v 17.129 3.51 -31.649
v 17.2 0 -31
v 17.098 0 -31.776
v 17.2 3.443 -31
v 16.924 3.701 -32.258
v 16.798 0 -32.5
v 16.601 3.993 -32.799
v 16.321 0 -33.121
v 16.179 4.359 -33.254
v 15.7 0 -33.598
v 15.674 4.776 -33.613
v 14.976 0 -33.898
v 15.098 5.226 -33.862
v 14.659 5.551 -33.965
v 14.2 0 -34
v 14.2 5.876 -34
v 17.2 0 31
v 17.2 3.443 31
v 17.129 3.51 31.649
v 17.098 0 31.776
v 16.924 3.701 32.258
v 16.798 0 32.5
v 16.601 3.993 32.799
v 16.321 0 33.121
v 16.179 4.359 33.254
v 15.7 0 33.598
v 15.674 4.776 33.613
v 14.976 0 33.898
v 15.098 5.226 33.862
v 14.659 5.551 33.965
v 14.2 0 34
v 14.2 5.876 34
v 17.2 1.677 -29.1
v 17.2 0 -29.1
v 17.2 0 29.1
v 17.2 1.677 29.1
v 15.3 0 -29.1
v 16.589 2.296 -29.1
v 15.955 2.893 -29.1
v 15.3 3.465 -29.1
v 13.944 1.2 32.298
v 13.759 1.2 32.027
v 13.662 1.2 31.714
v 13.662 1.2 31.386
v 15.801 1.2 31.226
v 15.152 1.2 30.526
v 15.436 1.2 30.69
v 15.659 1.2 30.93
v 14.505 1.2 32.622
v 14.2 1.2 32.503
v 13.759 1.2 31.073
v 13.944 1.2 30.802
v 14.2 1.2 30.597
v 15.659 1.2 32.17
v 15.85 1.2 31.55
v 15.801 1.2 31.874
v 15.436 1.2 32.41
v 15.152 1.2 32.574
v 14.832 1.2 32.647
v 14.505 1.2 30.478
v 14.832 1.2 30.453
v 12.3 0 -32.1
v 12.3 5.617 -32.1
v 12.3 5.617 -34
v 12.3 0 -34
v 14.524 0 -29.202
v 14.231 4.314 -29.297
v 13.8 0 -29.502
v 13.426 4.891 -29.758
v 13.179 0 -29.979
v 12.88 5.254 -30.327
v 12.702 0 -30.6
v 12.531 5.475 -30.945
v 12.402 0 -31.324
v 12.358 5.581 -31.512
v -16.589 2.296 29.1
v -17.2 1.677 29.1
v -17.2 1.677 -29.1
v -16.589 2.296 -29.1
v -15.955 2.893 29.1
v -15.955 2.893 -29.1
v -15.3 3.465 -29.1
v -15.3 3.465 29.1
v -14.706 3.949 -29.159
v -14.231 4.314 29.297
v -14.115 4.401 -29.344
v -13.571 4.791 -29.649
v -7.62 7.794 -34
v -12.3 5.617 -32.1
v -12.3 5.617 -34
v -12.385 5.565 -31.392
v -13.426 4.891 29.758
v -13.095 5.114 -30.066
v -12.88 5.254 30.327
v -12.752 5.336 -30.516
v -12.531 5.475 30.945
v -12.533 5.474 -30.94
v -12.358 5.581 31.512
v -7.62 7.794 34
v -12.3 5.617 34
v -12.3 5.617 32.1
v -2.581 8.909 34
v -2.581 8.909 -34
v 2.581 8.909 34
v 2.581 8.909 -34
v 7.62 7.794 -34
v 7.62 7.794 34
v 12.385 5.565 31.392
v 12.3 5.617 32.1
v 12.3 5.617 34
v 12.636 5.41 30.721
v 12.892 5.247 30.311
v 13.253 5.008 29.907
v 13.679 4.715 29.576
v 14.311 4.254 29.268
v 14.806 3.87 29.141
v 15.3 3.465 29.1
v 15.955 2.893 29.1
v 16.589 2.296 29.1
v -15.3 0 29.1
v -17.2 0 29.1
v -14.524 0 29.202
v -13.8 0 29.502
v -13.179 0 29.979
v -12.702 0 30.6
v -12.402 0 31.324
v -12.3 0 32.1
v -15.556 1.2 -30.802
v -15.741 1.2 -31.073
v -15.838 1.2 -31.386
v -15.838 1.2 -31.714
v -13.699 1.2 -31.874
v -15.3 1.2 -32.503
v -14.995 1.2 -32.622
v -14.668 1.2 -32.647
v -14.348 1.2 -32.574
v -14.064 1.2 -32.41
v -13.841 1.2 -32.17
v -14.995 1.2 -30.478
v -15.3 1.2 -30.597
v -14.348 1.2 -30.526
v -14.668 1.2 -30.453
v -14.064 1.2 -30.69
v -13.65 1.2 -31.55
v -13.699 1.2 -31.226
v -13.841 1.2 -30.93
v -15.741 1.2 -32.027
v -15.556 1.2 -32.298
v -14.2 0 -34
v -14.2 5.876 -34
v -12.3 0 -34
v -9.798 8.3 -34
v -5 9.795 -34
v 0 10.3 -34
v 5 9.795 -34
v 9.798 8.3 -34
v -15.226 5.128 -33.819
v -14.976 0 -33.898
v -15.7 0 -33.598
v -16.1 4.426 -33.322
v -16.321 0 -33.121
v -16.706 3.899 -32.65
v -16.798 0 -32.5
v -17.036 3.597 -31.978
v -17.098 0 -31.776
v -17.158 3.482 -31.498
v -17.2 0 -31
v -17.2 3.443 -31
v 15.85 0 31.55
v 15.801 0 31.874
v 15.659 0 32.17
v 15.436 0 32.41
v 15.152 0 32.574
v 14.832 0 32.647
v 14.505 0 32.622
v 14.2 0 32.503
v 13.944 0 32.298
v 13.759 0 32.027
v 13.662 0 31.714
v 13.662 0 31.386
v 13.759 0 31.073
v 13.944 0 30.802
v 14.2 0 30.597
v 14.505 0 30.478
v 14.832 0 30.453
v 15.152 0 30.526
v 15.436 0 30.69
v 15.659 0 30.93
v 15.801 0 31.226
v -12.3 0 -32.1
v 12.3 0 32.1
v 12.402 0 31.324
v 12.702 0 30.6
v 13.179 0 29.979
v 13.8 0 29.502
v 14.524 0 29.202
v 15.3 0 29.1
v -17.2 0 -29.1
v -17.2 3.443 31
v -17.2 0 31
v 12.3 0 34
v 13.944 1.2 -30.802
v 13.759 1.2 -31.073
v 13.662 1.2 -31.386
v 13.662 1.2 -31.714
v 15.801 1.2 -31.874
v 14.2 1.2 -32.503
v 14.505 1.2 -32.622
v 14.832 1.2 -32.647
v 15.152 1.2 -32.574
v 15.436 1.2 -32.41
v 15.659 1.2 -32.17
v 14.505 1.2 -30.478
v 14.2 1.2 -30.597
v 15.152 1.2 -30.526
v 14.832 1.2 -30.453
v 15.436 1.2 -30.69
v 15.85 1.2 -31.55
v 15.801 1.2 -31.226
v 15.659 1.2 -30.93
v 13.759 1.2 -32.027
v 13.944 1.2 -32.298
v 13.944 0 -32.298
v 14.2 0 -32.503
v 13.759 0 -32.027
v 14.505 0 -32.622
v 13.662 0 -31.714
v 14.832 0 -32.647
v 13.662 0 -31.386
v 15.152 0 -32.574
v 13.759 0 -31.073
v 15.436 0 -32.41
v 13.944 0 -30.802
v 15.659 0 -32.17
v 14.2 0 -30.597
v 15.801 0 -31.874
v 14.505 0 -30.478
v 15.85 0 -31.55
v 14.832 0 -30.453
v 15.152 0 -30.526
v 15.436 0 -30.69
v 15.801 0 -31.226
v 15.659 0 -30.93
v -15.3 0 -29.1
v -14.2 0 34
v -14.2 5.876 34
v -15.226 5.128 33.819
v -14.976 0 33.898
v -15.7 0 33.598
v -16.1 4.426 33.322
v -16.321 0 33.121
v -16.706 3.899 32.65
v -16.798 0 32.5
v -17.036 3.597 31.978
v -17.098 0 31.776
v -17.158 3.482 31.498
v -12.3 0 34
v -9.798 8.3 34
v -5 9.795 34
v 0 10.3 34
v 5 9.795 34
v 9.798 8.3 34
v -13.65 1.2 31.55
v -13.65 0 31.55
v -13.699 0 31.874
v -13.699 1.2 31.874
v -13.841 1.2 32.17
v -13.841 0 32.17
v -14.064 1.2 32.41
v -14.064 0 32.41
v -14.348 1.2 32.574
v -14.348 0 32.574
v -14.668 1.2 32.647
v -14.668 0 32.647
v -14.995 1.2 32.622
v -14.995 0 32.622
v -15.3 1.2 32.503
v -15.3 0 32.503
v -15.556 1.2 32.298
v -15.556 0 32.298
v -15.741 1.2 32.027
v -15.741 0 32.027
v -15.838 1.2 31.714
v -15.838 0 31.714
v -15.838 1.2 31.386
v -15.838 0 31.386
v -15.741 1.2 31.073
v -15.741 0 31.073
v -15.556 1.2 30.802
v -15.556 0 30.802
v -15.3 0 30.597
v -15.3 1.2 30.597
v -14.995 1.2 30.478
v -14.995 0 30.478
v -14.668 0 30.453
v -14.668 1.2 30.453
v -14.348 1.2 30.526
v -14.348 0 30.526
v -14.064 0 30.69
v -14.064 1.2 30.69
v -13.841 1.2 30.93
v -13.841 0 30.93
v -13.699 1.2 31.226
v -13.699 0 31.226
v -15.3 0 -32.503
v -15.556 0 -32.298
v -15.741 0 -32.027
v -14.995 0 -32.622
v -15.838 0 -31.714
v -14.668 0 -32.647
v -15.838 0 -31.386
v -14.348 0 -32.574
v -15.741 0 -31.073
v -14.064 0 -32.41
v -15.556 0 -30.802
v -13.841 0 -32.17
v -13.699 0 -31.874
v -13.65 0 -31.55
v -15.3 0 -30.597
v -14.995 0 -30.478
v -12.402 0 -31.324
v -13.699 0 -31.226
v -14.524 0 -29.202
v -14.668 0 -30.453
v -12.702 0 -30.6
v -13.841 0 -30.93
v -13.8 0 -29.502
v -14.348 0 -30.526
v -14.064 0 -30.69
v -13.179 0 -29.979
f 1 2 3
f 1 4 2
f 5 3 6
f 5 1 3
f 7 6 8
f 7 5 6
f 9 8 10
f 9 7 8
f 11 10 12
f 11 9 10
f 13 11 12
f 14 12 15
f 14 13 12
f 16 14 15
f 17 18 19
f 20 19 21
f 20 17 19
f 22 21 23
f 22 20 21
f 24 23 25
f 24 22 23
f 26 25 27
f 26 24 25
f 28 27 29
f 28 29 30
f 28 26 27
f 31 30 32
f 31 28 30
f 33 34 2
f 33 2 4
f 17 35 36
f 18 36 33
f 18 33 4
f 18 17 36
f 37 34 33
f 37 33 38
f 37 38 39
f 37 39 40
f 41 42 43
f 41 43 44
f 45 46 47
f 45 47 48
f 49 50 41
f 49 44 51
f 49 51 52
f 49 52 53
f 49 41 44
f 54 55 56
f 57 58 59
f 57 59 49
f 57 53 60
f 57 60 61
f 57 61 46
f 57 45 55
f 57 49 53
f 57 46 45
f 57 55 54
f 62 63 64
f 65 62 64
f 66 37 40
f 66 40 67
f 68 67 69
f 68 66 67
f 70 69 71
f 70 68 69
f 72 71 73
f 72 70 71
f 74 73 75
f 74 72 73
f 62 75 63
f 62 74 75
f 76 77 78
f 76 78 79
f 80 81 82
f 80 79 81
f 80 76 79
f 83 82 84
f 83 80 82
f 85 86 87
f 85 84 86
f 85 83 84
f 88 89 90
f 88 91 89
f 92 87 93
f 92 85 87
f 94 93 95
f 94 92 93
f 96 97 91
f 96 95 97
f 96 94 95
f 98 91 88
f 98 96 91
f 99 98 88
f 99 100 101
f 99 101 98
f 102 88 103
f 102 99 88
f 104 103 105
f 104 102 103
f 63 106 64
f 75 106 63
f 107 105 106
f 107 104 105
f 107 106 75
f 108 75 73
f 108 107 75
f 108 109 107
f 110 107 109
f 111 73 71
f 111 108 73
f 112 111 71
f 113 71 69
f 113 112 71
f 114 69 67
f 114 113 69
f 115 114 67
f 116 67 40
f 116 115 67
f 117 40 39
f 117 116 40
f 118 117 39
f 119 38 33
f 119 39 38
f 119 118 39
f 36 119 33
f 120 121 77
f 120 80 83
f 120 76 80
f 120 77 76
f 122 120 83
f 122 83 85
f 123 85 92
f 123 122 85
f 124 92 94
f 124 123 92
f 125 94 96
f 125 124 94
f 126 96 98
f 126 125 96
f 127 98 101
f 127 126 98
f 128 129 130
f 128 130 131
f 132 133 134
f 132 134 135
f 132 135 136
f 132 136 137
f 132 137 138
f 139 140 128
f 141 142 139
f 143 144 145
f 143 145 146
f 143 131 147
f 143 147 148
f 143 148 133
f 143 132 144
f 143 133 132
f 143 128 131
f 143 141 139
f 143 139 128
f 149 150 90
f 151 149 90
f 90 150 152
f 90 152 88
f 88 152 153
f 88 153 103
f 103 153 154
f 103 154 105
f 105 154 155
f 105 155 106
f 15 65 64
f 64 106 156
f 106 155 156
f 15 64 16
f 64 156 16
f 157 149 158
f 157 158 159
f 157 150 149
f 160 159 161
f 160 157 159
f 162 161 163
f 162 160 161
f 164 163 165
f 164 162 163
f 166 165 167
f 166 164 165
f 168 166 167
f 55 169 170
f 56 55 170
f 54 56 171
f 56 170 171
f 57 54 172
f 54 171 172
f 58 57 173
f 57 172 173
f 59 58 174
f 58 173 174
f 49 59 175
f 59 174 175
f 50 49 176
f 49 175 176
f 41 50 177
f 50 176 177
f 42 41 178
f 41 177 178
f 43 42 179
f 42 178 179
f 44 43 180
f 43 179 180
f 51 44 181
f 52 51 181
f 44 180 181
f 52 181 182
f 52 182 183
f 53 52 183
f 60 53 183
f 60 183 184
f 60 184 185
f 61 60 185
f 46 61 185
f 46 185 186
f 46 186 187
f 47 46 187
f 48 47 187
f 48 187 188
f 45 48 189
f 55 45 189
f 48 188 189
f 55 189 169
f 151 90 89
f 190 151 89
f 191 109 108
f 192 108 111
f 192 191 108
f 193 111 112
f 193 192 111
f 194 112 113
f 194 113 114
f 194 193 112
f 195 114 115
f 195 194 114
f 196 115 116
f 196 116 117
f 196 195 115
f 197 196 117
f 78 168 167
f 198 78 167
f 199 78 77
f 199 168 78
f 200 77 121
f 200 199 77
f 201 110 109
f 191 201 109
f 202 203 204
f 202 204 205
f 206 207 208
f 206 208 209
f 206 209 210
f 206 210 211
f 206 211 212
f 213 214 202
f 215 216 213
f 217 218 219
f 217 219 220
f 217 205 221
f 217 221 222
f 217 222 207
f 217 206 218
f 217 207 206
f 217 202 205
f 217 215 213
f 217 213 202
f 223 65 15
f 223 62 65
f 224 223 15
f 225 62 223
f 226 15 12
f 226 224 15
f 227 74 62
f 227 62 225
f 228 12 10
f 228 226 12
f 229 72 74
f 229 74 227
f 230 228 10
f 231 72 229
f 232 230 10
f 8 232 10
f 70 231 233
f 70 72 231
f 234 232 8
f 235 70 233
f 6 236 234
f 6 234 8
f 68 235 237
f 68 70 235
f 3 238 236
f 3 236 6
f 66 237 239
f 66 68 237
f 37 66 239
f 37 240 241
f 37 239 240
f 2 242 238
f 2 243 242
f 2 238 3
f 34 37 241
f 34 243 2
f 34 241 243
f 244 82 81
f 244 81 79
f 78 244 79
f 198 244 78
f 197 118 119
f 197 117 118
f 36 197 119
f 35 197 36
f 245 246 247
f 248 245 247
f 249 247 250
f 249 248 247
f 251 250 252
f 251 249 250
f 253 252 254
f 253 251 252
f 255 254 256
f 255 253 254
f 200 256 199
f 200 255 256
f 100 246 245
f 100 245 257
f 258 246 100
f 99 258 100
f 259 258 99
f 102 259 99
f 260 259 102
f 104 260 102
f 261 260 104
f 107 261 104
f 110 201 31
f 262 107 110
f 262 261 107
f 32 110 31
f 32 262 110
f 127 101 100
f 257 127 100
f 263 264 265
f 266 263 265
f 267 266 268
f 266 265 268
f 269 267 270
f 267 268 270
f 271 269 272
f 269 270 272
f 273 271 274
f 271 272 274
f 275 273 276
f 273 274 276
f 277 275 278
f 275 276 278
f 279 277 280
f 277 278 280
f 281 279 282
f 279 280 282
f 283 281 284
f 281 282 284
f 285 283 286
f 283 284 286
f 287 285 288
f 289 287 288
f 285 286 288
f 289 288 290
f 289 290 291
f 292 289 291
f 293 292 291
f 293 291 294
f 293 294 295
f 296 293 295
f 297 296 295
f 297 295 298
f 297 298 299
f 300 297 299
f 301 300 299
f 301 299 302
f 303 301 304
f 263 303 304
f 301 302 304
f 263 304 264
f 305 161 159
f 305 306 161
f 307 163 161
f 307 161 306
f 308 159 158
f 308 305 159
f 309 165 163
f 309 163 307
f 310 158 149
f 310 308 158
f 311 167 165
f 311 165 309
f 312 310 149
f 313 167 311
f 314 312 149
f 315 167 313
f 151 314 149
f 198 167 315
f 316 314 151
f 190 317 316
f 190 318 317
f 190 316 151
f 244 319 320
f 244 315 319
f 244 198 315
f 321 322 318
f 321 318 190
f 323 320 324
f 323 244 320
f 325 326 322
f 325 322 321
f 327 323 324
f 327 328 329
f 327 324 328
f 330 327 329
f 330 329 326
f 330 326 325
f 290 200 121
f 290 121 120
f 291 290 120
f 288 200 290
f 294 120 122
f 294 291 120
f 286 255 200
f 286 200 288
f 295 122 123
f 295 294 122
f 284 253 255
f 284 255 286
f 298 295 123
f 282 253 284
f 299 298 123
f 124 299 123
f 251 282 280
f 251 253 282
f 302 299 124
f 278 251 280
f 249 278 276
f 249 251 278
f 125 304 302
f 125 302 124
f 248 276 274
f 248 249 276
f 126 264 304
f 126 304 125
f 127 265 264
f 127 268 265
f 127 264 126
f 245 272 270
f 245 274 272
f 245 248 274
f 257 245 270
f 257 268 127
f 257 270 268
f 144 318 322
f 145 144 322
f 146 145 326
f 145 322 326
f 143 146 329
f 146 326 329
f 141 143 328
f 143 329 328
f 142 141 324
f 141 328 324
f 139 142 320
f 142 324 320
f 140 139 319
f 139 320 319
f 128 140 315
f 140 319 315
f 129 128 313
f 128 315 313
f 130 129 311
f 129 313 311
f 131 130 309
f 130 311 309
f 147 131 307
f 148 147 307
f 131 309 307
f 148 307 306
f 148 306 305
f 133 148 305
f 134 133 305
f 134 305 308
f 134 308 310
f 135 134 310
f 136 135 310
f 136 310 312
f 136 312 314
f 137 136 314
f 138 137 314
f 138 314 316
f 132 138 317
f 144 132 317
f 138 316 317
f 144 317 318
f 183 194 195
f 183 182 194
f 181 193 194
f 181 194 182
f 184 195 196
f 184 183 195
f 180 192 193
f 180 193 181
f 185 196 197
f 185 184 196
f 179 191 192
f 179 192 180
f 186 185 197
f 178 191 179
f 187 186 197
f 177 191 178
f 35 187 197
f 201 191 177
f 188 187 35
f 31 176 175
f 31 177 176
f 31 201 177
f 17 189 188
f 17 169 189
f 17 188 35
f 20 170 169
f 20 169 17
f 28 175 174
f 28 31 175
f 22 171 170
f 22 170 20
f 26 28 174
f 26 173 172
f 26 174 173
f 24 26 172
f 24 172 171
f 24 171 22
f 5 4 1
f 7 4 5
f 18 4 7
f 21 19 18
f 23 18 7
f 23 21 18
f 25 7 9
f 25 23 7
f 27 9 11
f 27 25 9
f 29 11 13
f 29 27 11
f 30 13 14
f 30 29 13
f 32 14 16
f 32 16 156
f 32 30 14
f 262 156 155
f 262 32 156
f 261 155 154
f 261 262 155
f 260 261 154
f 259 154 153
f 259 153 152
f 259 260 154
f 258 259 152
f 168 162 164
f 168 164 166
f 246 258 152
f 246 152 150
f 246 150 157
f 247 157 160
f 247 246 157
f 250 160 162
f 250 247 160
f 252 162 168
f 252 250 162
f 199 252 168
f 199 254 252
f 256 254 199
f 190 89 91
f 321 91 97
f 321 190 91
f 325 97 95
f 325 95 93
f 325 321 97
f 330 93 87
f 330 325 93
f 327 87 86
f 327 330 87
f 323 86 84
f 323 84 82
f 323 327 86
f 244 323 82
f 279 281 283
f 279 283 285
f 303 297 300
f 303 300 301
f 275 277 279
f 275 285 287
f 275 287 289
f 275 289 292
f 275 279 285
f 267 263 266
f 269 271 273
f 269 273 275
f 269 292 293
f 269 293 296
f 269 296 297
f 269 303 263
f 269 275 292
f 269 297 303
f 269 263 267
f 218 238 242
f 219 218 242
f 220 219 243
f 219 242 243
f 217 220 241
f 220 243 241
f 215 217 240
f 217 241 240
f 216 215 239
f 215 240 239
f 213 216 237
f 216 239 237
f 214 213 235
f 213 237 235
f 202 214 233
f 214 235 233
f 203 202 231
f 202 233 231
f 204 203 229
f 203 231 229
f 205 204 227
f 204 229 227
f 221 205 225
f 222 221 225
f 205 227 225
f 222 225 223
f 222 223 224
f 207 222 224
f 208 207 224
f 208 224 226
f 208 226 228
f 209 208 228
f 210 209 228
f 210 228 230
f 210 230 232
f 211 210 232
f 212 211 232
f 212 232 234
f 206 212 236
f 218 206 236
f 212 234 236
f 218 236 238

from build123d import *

# Parameters (mm, degrees)
F1_DEPTH = 34
F2_R     = 1.1
F4_DEPTH = 1.2
F5_R     = 3


with BuildPart() as f1:
    # F0 (on Top) → F1 (new body, symmetric)
    with BuildSketch(Plane.XY):
        with BuildLine():
            Line((17.2, 1.6774998092), (17.2, 3.4427671539))
            ThreePointArc((17.2, 3.4427671539), (0, 10.3), (-17.2, 3.4427671539))
            Line((-17.2, 3.4427671539), (-17.2, 1.6774998092))
            ThreePointArc((-17.2, 1.6774998092), (0, 9.05), (17.2, 1.6774998092))
        make_face()
    extrude(amount=F1_DEPTH, both=True)

    # F2 (on Front) → F3 (join, up to the next surface of F1)
    with BuildSketch(Plane.XZ):
        with BuildLine():
            Line((15.3, 29.1), (17.2, 29.1))
            Line((17.2, 29.1), (17.2, 34))
            Line((17.2, 34), (12.3, 34))
            Line((12.3, 34), (12.3, 32.1))
            ThreePointArc((12.3, 32.1), (13.1786796564, 29.9786796564), (15.3, 29.1))
        make_face()
        with Locations((14.75, 31.55)):
            Circle(F2_R, mode=Mode.SUBTRACT)
        with BuildLine():
            Line((-12.3, 34), (-17.2, 34))
            Line((-17.2, 34), (-17.2, 29.1))
            Line((-17.2, 29.1), (-15.3, 29.1))
            ThreePointArc((-15.3, 29.1), (-13.1786796564, 29.9786796564), (-12.3, 32.1))
            Line((-12.3, 32.1), (-12.3, 34))
        make_face()
        with Locations((-14.75, 31.55)):
            Circle(F2_R, mode=Mode.SUBTRACT)
        with Locations((14.75, 31.55)):
            Circle(F2_R)
        with Locations((-14.75, 31.55)):
            Circle(F2_R)
        with BuildLine():
            Line((-15.3, -29.1), (-17.2, -29.1))
            Line((-17.2, -29.1), (-17.2, -34))
            Line((-17.2, -34), (-12.3, -34))
            Line((-12.3, -34), (-12.3, -32.1))
            ThreePointArc((-12.3, -32.1), (-13.1786796564, -29.9786796564), (-15.3, -29.1))
        make_face()
        with Locations((-14.75, -31.55)):
            Circle(F2_R, mode=Mode.SUBTRACT)
        with Locations((-14.75, -31.55)):
            Circle(F2_R)
        with BuildLine():
            Line((12.3, -34), (17.2, -34))
            Line((17.2, -34), (17.2, -29.1))
            Line((17.2, -29.1), (15.3, -29.1))
            ThreePointArc((15.3, -29.1), (13.1786796564, -29.9786796564), (12.3, -32.1))
            Line((12.3, -32.1), (12.3, -34))
        make_face()
        with Locations((14.75, -31.55)):
            Circle(F2_R, mode=Mode.SUBTRACT)
        with Locations((14.75, -31.55)):
            Circle(F2_R)
    extrude(until=Until.NEXT, dir=(0, 1, 0))

    # F2 (on Front) → F4 (cut)
    with BuildSketch(Plane.XZ):
        with Locations((-14.75, -31.55)):
            Circle(F2_R)
        with Locations((-14.75, 31.55)):
            Circle(F2_R)
        with Locations((14.75, 31.55)):
            Circle(F2_R)
        with Locations((14.75, -31.55)):
            Circle(F2_R)
    extrude(amount=-F4_DEPTH, mode=Mode.SUBTRACT)

    # F5
    f5_edges = [f1.edges().sort_by_distance(p)[0] for p in [
        (-17.2, 1.721384, 34),
        (17.2, 1.721384, 34),
        (-17.2, 1.721384, -34),
        (17.2, 1.721384, -34),
    ]]
    fillet(f5_edges, radius=F5_R)


solid = f1.part
